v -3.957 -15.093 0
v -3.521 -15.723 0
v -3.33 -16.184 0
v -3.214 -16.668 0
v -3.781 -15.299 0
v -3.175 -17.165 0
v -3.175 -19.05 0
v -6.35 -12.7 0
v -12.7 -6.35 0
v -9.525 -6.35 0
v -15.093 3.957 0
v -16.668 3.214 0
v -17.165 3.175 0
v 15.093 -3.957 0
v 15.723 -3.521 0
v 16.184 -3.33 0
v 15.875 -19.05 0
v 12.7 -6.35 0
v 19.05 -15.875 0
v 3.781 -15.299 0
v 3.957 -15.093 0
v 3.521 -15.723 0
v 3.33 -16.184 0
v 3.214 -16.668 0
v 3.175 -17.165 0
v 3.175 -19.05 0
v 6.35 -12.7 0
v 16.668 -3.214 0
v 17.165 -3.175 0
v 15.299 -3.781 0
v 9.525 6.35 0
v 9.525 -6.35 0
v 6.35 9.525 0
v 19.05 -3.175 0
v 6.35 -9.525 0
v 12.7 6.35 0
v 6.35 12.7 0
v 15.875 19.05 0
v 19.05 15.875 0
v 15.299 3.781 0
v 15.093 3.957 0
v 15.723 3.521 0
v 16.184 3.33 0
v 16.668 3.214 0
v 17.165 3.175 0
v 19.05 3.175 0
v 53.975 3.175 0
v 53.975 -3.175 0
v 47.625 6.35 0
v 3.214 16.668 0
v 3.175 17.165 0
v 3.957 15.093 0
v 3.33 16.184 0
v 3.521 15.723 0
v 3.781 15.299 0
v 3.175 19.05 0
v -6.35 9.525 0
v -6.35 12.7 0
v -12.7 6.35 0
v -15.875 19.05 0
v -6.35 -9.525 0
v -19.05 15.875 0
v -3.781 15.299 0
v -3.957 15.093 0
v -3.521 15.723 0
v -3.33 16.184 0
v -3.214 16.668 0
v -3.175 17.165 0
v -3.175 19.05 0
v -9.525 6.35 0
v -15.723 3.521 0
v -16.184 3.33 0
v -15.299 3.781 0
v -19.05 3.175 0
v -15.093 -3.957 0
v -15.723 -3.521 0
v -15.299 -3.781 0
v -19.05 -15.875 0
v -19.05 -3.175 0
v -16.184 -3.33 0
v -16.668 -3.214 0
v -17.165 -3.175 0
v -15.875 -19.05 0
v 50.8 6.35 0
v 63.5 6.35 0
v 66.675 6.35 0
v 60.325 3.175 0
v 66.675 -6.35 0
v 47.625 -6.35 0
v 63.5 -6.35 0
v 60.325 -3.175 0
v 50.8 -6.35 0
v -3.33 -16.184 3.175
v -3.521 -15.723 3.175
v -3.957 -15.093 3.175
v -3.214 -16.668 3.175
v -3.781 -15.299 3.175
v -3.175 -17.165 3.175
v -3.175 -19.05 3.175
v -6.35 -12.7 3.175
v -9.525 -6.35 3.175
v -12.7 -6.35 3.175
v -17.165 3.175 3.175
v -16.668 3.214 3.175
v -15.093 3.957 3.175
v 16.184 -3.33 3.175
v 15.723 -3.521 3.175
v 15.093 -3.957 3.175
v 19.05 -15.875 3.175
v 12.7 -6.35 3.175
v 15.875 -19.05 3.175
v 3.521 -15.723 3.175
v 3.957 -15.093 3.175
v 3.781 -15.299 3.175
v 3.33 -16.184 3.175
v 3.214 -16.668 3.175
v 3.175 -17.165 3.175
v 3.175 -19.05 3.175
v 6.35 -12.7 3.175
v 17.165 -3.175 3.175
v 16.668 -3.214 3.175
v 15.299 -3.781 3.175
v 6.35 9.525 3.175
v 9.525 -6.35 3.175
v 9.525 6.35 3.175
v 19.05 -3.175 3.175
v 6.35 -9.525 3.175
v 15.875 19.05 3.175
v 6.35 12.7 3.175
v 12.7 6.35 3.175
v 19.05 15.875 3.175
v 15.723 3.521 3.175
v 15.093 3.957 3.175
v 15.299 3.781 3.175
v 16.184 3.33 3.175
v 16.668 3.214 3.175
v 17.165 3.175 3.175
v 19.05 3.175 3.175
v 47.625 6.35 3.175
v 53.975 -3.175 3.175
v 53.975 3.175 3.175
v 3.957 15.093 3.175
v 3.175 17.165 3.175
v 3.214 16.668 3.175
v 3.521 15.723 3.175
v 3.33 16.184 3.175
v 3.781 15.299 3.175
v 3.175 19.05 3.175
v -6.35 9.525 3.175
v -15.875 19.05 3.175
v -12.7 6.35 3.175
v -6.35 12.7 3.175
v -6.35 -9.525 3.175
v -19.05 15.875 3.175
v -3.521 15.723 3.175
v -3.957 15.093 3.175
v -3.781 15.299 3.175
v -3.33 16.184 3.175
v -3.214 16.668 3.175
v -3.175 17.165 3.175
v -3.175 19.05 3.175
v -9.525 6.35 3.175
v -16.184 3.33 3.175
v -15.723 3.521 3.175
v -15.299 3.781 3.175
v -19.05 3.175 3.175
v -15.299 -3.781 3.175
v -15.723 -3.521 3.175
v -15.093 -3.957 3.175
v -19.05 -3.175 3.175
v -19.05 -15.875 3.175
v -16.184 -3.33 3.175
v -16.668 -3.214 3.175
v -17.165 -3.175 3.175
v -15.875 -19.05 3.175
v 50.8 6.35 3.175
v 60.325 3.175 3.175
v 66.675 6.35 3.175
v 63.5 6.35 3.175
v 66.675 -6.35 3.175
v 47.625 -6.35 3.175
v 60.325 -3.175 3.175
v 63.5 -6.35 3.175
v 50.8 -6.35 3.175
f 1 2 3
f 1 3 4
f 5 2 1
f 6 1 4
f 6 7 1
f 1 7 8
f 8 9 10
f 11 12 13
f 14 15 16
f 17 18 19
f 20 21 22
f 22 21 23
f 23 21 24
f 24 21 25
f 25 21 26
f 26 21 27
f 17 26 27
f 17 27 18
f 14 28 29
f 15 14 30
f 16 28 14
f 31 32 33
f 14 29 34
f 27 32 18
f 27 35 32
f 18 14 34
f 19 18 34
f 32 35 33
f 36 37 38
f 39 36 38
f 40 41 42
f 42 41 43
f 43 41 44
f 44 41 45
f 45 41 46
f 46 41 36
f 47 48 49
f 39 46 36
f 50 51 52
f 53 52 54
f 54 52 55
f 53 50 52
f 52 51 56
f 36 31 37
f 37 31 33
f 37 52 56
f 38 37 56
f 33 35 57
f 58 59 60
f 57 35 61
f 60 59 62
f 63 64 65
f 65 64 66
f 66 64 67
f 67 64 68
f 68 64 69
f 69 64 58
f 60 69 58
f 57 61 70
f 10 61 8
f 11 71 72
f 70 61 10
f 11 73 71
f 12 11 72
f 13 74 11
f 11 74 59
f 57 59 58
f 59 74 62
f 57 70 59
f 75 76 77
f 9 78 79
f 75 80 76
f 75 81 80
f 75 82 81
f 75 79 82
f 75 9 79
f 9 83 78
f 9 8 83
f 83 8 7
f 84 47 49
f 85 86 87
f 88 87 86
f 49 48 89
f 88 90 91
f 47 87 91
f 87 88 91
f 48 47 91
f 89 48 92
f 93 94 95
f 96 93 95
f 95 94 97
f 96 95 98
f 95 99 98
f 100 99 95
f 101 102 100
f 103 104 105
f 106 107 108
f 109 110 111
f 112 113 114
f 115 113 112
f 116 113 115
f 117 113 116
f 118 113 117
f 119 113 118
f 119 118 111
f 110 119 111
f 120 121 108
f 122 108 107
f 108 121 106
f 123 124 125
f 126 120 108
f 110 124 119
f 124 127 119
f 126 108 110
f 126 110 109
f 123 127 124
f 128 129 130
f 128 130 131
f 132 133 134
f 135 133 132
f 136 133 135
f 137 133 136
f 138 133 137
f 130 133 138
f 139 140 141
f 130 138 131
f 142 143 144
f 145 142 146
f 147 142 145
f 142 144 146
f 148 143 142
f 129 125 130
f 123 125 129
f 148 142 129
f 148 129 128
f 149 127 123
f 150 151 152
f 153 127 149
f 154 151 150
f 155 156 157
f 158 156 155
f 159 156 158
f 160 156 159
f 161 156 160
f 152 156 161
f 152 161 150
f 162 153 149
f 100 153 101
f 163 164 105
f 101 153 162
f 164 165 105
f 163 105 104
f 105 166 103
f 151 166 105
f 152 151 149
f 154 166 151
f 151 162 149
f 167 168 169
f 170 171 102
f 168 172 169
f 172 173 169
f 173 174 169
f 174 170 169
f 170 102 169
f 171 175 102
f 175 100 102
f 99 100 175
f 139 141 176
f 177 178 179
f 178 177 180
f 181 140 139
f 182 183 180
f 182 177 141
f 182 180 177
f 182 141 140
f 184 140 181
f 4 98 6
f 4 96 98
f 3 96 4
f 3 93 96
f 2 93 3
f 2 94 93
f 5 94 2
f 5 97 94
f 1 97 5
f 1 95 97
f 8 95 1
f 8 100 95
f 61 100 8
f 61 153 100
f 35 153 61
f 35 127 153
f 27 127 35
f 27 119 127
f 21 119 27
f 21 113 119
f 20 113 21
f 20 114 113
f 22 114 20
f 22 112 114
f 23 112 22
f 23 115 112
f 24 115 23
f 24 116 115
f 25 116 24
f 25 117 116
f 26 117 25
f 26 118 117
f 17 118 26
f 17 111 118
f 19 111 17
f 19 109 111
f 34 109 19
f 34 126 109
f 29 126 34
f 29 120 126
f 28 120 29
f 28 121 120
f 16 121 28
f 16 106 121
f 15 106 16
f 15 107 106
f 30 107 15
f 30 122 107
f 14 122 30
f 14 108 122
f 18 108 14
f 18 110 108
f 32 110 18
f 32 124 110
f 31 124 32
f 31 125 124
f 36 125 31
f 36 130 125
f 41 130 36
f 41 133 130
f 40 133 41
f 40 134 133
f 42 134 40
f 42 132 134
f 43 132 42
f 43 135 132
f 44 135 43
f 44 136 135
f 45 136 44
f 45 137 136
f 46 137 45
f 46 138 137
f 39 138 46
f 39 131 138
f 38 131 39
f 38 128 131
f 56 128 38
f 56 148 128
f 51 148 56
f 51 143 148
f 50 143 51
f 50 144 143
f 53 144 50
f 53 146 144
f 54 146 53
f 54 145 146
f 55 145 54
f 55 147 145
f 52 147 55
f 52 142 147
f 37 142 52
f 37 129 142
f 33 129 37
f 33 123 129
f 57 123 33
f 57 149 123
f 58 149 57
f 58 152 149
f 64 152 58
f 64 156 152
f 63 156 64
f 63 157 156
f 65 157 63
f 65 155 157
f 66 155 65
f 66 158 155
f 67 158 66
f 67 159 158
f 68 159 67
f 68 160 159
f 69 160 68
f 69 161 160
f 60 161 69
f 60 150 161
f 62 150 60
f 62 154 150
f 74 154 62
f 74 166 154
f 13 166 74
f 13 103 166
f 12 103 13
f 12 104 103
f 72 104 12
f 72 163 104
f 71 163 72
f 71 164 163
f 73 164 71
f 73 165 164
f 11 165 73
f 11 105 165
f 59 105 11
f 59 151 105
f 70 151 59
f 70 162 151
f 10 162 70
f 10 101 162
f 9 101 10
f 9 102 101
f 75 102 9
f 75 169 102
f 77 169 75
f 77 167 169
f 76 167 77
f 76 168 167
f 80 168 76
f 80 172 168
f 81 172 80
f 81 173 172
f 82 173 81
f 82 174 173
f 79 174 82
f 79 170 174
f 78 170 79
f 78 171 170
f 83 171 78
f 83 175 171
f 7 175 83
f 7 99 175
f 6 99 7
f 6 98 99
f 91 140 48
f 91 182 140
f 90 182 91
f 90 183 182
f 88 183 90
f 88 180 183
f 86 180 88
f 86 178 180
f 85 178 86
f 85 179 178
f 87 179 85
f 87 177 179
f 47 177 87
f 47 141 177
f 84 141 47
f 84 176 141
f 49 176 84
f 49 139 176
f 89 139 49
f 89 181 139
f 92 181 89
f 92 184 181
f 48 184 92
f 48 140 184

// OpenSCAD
// file: ../lib/BowtieLib-v0.scad
// Minimally-altered copy of BowtieLib from ProjectNotes2/2023/3DPrinting/BowtieConnector/BowtieLib.scad

inch = 25.4;

bowtie_point_data = [
	// X, Y (length/6), offsetX, offsetY (caller units)
	[-3, 2,-1  , 1],
	[-2, 2, 0.5, 1],
	[-1, 1, 0.5, 1],
	[ 1, 1,-0.5, 1],
	[ 2, 2,-0.5, 1],
	[ 3, 2, 1  , 1],
	[ 3,-2, 1  ,-1],
	[ 2,-2,-0.5,-1],
	[ 1,-1,-0.5,-1],
	[-1,-1, 0.5,-1],
	[-2,-2, 0.5,-1],
	[-3,-2,-1  ,-1]
];

module beveled_square(size, r) {
	x0 = -size[0]/2;
	x1 = +size[0]/2;
	y0 = -size[1]/2;
	y1 = +size[1]/2;
	polygon([
		[x0+r, y0  ],
		[x0  , y0+r],
		[x0  , y1-r],
		[x0+r, y1  ],
		[x1-r, y1  ],
		[x1  , y1-r],
		[x1  , y0+r],
		[x1-r, y0  ]
	]);
}

function grid_cell_center_positions(area_size, cell_size) = [
	for( y=[ -area_size[1]/2+cell_size[1]/2 : cell_size[1] : area_size[1]/2-cell_size[1]/2 ] )
		for( x=[ -area_size[0]/2+cell_size[0]/2 : cell_size[0] : area_size[0]/2-cell_size[0]/2 ] )
			[x,y]
];

/**
 * Given point data of the form
 * [
 *   [x, y, offset_x, offset_y],
 *   ...
 * ]
 * 
 * Returns a list of points where x and y are multiplied by base_multiplier
 * and have offset multiplied by offseT_multiplier added to them.
 */
function offset_points( point_data, base_multiplier, offset_multiplier ) = [
	for( d=point_data ) [d[0]*base_multiplier + d[2]*offset_multiplier, d[1]*base_multiplier + d[3]*offset_multiplier]
];

function bowtie_connector_points( length, offset=0 ) =
	offset_points(bowtie_point_data, length/6, offset);
	//for( d=bowtie_point_data ) [d[0]*length/6 + d[2]*offset, d[1]*length/6 + d[3]*offset];

module bowtie_connector_2d( length, r_offset=0 ) {
	polygon( bowtie_connector_points(length, r_offset) );
}

function is3QuarterInch(number) = round(number*100) == 1905;

// Closest to the angular bowtie of whose shape a a hole could be cut using a quarter-inch diameter router bit
module quarter_bit_cutout_bowtie(length, r_offset) {
	if( !is3QuarterInch(length) ) {
		assert(false, str("'quarter-bit-cutout' bowtie requires length to be 3/4*inch, i.e. 19.05mm; given ", length));
	}
	inner_rad = 1/8*inch + r_offset;
	outer_rad = 1/8*inch - r_offset;
	difference() {
		union() {
			square([4/8*inch, 3/8*inch], center=true);
			for( xm=[-1,1] ) hull() {
				translate([-77/256*inch*xm,  1/8*inch]) circle(r=inner_rad);
				translate([-45/256*inch*xm,  0          ]) circle(r=inner_rad);
				translate([-77/256*inch*xm, -1/8*inch]) circle(r=inner_rad);
			}
		}
		for( ym=[-1,1] ) hull() for( xm=[-1,1] ) {
			translate([19/256*inch*xm, 1/4*inch*ym]) circle(r=outer_rad);
			translate([(1+19/256)*inch*xm, (1+1/4)*inch*ym]) circle(r=outer_rad);
		}
	}
}

// One that will fit into hole made for a rounded one or a straight-edged one
module minimal_bowtie(length, r_offset) {
	if( !is3QuarterInch(length) ) {
		assert(false, str("'minimal' bowtie requires length to be 3/4*inch, i.e. 19.05mm; given ", length));
	}
	intersection() {
		bowtie_connector_2d(length, r_offset);
		quarter_bit_cutout_bowtie(length, r_offset);
	}
}
module maximal_bowtie(length, r_offset) {
	if( !is3QuarterInch(length) ) {
		assert(false, str("'maximal' bowtie requires length to be 3/4*inch, i.e. 19.05mm; given ", length));
	}
	union() {
		bowtie_connector_2d(length, r_offset);
		quarter_bit_cutout_bowtie(length, r_offset);
	}
}
// A good choice for holes meant to accomodate angled or round bowties
module semi_maximal_bowtie(length, r_offset) {
	if( !is3QuarterInch(length) ) {
		assert(false, str("'semi-maximal' bowtie requires length to be 3/4*inch, i.e. 19.05mm; given ", length));
	}
	union() {
		bowtie_connector_2d(3/4*inch, r_offset);
		intersection() {
			quarter_bit_cutout_bowtie(length, r_offset);
			square([3/4*inch + r_offset*2, 1/2*inch + r_offset*2], center=true);
		}
	}
}

module bowtie_of_style(style_name, length, r_offset) {
	if( style_name == "angular" ) {
		bowtie_connector_2d(length, r_offset);
	} else if( style_name == "quarter-bit-cutout" ) {
		quarter_bit_cutout_bowtie(length, r_offset);
	} else if( style_name == "maximal" ) {
		maximal_bowtie(length, r_offset);
	} else if( style_name == "semi-maximal" ) {
		semi_maximal_bowtie(length, r_offset);
	} else {
		assert(false, str("Unsupported bowtie style: '",style_name, "'") ); // lolmao
	}
}

function fencepost_positions_ofe(length, unit_length, offset_from_ends) = [
	for( i=[-length/2 + offset_from_ends : unit_length : +length/2 - offset_from_ends + 0.01] ) i
];
// TODO: hese two could be rewritten in terms of fencepost_positions_ofe
function fencepost_positions(length, unit_length, include_ends) = [
	for( i=[-length/2 + (include_ends ? 0 : unit_length) : unit_length : +length/2 - (include_ends ? 0 : unit_length)] ) i
];
function fencebeam_positions(length, unit_length, include_ends) = [
	for( i=[-length/2 + (include_ends ? unit_length/2 : 3*unit_length/2) : unit_length : +length/2 + 0.01 - (include_ends ? unit_length/2 : 3*unit_length/2)] ) i
];

function fencepost_positions_ofe_2d(area_size, cell_size, offset_from_ends) = [
	for( y=fencepost_positions_ofe(area_size[1], cell_size[1], offset_from_ends) )
		for( x=fencepost_positions_ofe(area_size[0], cell_size[0], offset_from_ends) )
			[x,y]
];

function bowtie_positions(panel_size, unit_size, offset_from_ends) = [
	for( y=fencepost_positions_ofe(panel_size[1], unit_size[1], offset_from_ends) )
	     for( x=[-panel_size[0]/2, panel_size[0]/2] )
		[x,y,0],
	for( x=fencepost_positions_ofe(panel_size[0], unit_size[0], offset_from_ends) )
	     for( y=[-panel_size[1]/2, panel_size[1]/2] )
		[x,y,90],
];

module bowtie_test_plate_2d(panel_size, bowtie_length, offset, corner_radius=3.175, bowtie_position_offset=1, bowtie_style="semi-maximal") {
	difference() {
		beveled_square([panel_size[0]+offset*2, panel_size[1]+offset*2], corner_radius);
		for( pos=bowtie_positions(panel_size, [bowtie_length, bowtie_length], bowtie_position_offset*bowtie_length ) ) {
			translate([pos[0],pos[1]]) rotate([0,0,pos[2]]) bowtie_of_style(bowtie_style, bowtie_length, -offset);
		}
		if( bowtie_position_offset == 0.5 ) {
			// Chop off corners
			for( r=[0:90:270] ) rotate([0,0,r]) {
				translate([bowtie_length*2, bowtie_length*2]) square([bowtie_length, bowtie_length], center=true);
			}
		}
	}
}

// Flathead screw profile data:
// [head_surface_diam, head_base_diam, head_height]

module countersunk_hole(head_surface_diam, head_height, shaft_diam, hole_depth) {
	cylinder(d1=shaft_diam, d2=head_surface_diam+(head_surface_diam-shaft_diam), h=head_height*2, center=true);
	translate([0,0,-hole_depth/2]) cylinder(d=shaft_diam, h=hole_depth, center=true);
}
// main file
panel_size = [38.1, 38.1];
bowtie_length = 19.05;
thickness = 3.175;

$fn = 40;

include <../lib/BowtieLib-v0.scad>;

linear_extrude(thickness) {
	bowtie_test_plate_2d(panel_size, bowtie_length, 0);

	translate([panel_size[0]+bowtie_length, 0, 0]) bowtie_of_style("angular", bowtie_length, 0);
}
